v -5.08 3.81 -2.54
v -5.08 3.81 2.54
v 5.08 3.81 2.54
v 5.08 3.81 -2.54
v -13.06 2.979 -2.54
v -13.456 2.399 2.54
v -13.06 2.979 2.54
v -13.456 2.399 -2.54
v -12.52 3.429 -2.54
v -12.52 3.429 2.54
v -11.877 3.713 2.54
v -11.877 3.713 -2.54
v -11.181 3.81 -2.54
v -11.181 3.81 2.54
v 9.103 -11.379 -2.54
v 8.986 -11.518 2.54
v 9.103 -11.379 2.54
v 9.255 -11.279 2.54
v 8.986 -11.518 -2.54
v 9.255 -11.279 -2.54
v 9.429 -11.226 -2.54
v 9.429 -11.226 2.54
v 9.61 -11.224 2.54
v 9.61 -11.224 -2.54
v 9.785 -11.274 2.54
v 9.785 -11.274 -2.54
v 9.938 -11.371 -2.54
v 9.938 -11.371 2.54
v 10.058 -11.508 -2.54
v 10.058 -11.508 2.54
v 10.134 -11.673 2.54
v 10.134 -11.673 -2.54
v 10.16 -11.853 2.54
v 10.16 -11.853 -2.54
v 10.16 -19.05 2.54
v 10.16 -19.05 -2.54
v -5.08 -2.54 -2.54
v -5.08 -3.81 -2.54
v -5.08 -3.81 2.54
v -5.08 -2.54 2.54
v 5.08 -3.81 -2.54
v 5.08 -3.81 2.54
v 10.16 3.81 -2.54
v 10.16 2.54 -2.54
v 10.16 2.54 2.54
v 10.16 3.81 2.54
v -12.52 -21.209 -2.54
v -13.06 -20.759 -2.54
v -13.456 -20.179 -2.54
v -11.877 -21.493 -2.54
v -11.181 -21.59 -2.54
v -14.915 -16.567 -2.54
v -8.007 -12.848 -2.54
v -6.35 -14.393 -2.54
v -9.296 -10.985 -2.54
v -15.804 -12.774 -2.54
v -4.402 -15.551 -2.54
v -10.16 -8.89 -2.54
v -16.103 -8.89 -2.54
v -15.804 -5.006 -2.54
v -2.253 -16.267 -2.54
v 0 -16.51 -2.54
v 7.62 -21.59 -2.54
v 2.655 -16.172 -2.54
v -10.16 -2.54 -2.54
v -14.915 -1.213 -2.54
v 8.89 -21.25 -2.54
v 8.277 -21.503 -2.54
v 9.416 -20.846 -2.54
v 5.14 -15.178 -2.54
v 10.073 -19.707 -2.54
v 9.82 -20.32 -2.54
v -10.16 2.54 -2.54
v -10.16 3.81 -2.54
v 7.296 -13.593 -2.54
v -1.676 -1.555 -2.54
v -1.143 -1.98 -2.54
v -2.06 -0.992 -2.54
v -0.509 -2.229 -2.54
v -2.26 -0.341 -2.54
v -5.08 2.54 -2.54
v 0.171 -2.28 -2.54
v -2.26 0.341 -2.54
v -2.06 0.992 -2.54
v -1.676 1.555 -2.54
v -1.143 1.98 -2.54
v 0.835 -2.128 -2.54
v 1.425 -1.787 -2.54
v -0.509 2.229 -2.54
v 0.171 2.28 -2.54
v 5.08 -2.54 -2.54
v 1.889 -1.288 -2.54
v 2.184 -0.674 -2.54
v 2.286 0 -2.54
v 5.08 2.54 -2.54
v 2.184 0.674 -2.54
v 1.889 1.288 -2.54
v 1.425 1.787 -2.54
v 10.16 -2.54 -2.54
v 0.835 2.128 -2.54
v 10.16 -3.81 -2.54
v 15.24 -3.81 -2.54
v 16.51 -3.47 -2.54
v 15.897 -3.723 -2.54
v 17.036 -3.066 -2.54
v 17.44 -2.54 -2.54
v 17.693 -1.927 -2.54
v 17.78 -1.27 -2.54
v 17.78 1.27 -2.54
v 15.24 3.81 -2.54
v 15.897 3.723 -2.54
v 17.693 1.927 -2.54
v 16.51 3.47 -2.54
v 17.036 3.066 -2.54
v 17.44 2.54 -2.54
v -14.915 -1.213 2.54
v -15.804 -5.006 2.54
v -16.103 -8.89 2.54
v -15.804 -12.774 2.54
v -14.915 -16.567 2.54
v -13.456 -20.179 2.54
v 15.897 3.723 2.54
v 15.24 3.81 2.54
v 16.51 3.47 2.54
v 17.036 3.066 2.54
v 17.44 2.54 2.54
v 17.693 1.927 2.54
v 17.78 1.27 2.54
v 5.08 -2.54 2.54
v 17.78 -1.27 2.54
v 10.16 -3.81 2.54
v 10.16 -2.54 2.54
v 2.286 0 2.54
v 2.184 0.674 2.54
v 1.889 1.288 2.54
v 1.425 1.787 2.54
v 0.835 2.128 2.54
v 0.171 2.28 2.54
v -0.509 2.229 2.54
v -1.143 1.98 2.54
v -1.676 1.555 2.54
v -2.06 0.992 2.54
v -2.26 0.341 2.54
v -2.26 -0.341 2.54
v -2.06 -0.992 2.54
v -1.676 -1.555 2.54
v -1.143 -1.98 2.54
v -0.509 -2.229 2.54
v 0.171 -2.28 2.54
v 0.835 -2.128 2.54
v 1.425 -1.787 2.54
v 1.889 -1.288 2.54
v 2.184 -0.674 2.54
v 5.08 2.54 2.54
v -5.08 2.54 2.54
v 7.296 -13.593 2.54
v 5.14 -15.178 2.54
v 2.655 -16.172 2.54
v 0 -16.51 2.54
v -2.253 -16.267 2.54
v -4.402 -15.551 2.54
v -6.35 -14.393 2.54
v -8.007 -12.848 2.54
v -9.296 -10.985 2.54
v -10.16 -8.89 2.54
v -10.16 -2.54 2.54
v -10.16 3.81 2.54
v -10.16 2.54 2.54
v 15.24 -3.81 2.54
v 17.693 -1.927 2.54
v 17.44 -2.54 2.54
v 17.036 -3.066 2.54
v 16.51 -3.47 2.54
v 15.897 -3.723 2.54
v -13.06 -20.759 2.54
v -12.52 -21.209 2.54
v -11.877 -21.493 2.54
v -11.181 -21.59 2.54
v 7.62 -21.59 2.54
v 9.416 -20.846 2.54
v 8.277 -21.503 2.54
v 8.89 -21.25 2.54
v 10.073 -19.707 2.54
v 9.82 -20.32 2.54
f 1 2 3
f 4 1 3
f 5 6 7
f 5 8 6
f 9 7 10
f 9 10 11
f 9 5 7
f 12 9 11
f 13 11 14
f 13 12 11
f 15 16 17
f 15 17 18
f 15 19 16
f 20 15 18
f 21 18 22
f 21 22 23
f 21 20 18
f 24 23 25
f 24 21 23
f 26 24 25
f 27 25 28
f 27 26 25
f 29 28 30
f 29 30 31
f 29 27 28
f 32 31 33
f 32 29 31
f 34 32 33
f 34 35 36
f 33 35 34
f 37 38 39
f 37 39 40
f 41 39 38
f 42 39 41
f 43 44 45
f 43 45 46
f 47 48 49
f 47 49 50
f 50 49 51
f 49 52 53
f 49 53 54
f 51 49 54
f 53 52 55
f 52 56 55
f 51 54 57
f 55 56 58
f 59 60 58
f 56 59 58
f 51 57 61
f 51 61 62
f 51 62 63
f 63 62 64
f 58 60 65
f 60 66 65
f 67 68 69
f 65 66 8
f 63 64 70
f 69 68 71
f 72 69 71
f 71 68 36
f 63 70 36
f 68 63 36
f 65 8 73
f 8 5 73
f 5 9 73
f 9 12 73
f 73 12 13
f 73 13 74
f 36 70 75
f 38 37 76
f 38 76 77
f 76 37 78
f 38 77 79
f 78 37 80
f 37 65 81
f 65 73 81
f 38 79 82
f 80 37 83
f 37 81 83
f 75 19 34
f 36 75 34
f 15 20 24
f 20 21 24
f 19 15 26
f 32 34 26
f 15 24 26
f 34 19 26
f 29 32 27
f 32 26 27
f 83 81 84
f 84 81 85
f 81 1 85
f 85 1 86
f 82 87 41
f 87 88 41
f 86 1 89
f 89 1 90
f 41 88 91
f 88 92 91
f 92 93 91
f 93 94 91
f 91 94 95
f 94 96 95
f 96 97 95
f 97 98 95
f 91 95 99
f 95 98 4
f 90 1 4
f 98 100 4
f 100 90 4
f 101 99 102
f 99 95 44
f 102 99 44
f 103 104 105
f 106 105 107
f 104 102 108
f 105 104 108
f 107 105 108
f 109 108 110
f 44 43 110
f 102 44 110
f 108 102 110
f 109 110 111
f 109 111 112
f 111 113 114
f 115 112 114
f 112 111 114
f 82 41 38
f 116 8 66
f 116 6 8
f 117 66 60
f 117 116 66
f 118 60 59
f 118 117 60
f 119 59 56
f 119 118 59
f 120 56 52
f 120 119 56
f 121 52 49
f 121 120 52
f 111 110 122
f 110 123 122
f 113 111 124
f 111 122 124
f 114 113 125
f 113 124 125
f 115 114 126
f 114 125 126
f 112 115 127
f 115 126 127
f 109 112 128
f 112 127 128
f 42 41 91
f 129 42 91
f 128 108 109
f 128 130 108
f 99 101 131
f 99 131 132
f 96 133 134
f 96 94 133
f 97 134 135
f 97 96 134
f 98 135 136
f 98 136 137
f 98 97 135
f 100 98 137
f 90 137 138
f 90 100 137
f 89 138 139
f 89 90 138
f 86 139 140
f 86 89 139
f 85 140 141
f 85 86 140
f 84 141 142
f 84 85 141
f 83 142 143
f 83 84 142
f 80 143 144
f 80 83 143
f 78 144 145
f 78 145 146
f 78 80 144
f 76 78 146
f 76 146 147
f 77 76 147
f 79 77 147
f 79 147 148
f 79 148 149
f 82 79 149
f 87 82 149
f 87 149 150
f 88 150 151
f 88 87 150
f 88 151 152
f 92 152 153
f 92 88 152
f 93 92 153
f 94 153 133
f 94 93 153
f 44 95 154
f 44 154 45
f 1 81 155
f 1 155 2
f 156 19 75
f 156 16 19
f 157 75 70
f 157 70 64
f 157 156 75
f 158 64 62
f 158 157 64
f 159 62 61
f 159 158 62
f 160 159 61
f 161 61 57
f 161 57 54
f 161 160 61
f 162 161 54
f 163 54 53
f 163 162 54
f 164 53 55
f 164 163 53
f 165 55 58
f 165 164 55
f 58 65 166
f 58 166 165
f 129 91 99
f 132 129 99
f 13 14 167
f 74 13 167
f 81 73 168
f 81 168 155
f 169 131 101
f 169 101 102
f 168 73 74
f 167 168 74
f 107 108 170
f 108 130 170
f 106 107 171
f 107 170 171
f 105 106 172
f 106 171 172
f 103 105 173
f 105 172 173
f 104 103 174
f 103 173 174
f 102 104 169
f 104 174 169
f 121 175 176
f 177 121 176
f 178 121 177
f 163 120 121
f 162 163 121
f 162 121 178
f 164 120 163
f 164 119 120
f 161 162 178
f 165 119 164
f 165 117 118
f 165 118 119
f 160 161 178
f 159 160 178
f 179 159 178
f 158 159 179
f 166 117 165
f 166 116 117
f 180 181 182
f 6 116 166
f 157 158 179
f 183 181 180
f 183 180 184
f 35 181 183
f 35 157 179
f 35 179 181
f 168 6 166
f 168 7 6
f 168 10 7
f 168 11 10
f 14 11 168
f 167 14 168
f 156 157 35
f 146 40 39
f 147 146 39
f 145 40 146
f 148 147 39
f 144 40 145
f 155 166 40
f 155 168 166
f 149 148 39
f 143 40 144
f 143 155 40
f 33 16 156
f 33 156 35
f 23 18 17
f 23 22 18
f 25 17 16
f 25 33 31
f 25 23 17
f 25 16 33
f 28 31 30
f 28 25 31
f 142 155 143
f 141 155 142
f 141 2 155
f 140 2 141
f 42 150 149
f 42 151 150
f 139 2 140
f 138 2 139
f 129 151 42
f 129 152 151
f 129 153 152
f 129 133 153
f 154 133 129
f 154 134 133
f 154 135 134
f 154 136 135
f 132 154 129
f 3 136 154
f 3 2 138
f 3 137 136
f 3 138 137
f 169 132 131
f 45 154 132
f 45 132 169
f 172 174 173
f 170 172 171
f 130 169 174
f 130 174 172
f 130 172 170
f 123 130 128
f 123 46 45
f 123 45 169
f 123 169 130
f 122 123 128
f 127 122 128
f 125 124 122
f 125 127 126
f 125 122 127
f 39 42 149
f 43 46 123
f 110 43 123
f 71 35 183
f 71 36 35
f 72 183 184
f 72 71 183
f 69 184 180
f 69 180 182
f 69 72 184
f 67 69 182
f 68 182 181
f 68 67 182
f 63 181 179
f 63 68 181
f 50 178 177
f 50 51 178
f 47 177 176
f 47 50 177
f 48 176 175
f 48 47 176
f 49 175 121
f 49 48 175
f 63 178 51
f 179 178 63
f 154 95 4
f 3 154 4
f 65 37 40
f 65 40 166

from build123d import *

# Parameters (mm, degrees)
SKETCH1_W              = 30.48
SKETCH1_H              = 7.62
SKETCH1_R              = 2.286
BOSS_EXTRUDE1_DEPTH    = 2.54
FILLET1_R              = 2.54
FILLET2_R              = 5.08
CUT_EXTRUDE1_START     = -5.08
CUT_EXTRUDE1_OUTLINE_W = 5.08
CUT_EXTRUDE1_OUTLINE_H = 1.27
CUT_EXTRUDE1_DEPTH     = 5.08
FILLET3_R              = 0.635


# Read off the part's stored shape, not the designer's step: Cut-Extrude1
with BuildPart() as part:
    # Sketch1 → Boss-Extrude1 (new, symmetric)
    # profile 1 of 7: a face of its own
    with BuildSketch(Plane.XY):
        with Locations((2.54, 0)):
            Rectangle(SKETCH1_W, SKETCH1_H)
        Circle(SKETCH1_R, mode=Mode.SUBTRACT)
    # profile 2 of 7: a face of its own
    with BuildSketch(Plane.XY):
        with BuildLine():
            Line((-12.7, -16.51), (-12.7, -3.81))
            Line((-12.7, -3.81), (-12.7, 3.81))
            ThreePointArc((-12.7, 3.81), (-16.102954744, -8.89), (-12.7, -21.59))
            Line((-12.7, -21.59), (-12.7, -16.51))
        make_face()
    # profile 3 of 7: a face of its own
    with BuildSketch(Plane.XY):
        Polygon((-10.16, -3.81), (-12.7, -3.81), (-12.7, -16.51), (-10.16, -16.51), (-10.16, -8.89), align=None)
    # profile 4 of 7: a face of its own
    with BuildSketch(Plane.XY):
        Polygon((-10.16, -16.51), (-12.7, -16.51), (-12.7, -21.59), (10.16, -21.59), (10.16, -16.51), (9e-09, -16.51), align=None)
    # profile 5 of 7: a face of its own
    with BuildSketch(Plane.XY):
        with BuildLine():
            ThreePointArc((9e-09, -16.51), (-6.349999997, -14.393333336), (-10.16, -8.89))
            Line((-10.16, -8.89), (-10.16, -16.51))
            Line((-10.16, -16.51), (9e-09, -16.51))
        make_face()
    # profile 6 of 7: a face of its own
    with BuildSketch(Plane.XY):
        with BuildLine():
            ThreePointArc((10.16, -8.89), (6.350000003, -14.393333331), (9e-09, -16.51))
            Line((9e-09, -16.51), (10.16, -16.51))
            Line((10.16, -16.51), (10.16, -8.89))
        make_face()
    # profile 7 of 7: a face of its own
    with BuildSketch(Plane.XY):
        with BuildLine():
            ThreePointArc((10.16, -8.89), (6.350000003, -14.393333331), (9e-09, -16.51))
            Line((9e-09, -16.51), (10.16, -16.51))
            Line((10.16, -16.51), (10.16, -8.89))
        make_face()
    extrude(amount=BOSS_EXTRUDE1_DEPTH, both=True)

    # Fillet1
    fillet1_edges = [part.edges().sort_by_distance(p)[0] for p in [
        (10.16, -21.59, 0),
        (-12.7, -21.59, 0),
        (-12.7, 3.81, 0),
        (17.78, 3.81, 0),
        (17.78, -3.81, 0),
    ]]
    fillet(fillet1_edges, radius=FILLET1_R)

    # Fillet2
    fillet2_edges = [part.edges().sort_by_distance(p)[0] for p in [
        (-10.16, -3.81, 0),
    ]]
    fillet(fillet2_edges, radius=FILLET2_R - 0.0001)  # a hair under: the kernel refuses the full size

    # Cut-Extrude1 outline → Cut-Extrude1 (cut)
    with BuildSketch(Plane.XY.offset(2.54).offset(CUT_EXTRUDE1_START)):
        with BuildLine():
            ThreePointArc((-10.16, -8.89), (-8.672102448, -5.297897552), (-5.08, -3.81))
            Line((-5.08, -3.81), (-5.08, -2.54))
            Line((-5.08, -2.54), (-10.16, -2.54))
            Line((-10.16, -2.54), (-10.16, -8.89))
        make_face()
        with Locations((7.62, -3.175)):
            Rectangle(CUT_EXTRUDE1_OUTLINE_W, CUT_EXTRUDE1_OUTLINE_H)
        with Locations((7.62, 3.175)):
            Rectangle(CUT_EXTRUDE1_OUTLINE_W, CUT_EXTRUDE1_OUTLINE_H)
        with Locations((-7.62, 3.175)):
            Rectangle(CUT_EXTRUDE1_OUTLINE_W, CUT_EXTRUDE1_OUTLINE_H)
    extrude(amount=CUT_EXTRUDE1_DEPTH, mode=Mode.SUBTRACT)

    # Fillet3
    fillet3_edges = [part.edges().sort_by_distance(p)[0] for p in [
        (10.16, -8.89, 0),
    ]]
    fillet(fillet3_edges, radius=FILLET3_R)


solid = part.part
